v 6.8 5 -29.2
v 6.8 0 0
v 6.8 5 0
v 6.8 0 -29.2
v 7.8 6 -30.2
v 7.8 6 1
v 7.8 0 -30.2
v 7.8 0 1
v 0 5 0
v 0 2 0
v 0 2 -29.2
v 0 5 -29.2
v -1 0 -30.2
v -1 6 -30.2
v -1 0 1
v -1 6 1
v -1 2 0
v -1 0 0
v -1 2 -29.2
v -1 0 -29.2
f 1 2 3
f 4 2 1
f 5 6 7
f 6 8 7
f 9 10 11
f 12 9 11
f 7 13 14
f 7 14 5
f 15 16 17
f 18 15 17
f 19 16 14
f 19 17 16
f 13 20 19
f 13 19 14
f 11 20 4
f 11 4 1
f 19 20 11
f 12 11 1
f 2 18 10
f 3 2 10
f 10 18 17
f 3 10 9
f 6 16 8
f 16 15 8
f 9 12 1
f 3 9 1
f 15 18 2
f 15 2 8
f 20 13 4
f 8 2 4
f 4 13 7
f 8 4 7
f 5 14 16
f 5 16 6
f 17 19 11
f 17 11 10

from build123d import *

# Parameters (mm, degrees)
SKETCH1_W           = 8.8
SKETCH1_H           = 31.2
SKETCH1_W_2         = 6.8
SKETCH1_H_2         = 29.2
BOSS_EXTRUDE1_DEPTH = 5
SKETCH2_W           = 8.8
SKETCH2_H           = 31.2
BOSS_EXTRUDE2_DEPTH = 1
CUT_EXTRUDE1_REACH  = 34.023
SKETCH3_W           = 29.2
SKETCH3_H           = 2


with BuildPart() as part:
    # Sketch1 → Boss-Extrude1 (new body)
    with BuildSketch(Plane(origin=(0, 0, 0), x_dir=(1, 0, 0), z_dir=(0, 1, 0))):
        with Locations((3.4, 14.6)):
            Rectangle(SKETCH1_W, SKETCH1_H)
        with Locations((3.4, 14.6)):
            Rectangle(SKETCH1_W_2, SKETCH1_H_2, mode=Mode.SUBTRACT)
    extrude(amount=BOSS_EXTRUDE1_DEPTH)

    # Sketch2 → Boss-Extrude2 (add)
    with BuildSketch(Plane(origin=(0, 5, 0), x_dir=(1, 0, 0), z_dir=(0, 1, 0))):
        with Locations((3.4, 14.6)):
            Rectangle(SKETCH2_W, SKETCH2_H)
    extrude(amount=BOSS_EXTRUDE2_DEPTH)

    # Sketch3 → Cut-Extrude1 (cut, up to next)
    with BuildSketch(Plane.ZY.offset(1), mode=Mode.PRIVATE) as cut_extrude1_sk1:
        with Locations((-14.6, 1)):
            Rectangle(SKETCH3_W, SKETCH3_H)
    cut_extrude1_tool1 = extrude(cut_extrude1_sk1.sketch, amount=-CUT_EXTRUDE1_REACH, mode=Mode.PRIVATE) & part.part
    add(cut_extrude1_tool1.solids().sort_by_distance((-1, 1, -14.6))[0], mode=Mode.SUBTRACT)


solid = part.part
